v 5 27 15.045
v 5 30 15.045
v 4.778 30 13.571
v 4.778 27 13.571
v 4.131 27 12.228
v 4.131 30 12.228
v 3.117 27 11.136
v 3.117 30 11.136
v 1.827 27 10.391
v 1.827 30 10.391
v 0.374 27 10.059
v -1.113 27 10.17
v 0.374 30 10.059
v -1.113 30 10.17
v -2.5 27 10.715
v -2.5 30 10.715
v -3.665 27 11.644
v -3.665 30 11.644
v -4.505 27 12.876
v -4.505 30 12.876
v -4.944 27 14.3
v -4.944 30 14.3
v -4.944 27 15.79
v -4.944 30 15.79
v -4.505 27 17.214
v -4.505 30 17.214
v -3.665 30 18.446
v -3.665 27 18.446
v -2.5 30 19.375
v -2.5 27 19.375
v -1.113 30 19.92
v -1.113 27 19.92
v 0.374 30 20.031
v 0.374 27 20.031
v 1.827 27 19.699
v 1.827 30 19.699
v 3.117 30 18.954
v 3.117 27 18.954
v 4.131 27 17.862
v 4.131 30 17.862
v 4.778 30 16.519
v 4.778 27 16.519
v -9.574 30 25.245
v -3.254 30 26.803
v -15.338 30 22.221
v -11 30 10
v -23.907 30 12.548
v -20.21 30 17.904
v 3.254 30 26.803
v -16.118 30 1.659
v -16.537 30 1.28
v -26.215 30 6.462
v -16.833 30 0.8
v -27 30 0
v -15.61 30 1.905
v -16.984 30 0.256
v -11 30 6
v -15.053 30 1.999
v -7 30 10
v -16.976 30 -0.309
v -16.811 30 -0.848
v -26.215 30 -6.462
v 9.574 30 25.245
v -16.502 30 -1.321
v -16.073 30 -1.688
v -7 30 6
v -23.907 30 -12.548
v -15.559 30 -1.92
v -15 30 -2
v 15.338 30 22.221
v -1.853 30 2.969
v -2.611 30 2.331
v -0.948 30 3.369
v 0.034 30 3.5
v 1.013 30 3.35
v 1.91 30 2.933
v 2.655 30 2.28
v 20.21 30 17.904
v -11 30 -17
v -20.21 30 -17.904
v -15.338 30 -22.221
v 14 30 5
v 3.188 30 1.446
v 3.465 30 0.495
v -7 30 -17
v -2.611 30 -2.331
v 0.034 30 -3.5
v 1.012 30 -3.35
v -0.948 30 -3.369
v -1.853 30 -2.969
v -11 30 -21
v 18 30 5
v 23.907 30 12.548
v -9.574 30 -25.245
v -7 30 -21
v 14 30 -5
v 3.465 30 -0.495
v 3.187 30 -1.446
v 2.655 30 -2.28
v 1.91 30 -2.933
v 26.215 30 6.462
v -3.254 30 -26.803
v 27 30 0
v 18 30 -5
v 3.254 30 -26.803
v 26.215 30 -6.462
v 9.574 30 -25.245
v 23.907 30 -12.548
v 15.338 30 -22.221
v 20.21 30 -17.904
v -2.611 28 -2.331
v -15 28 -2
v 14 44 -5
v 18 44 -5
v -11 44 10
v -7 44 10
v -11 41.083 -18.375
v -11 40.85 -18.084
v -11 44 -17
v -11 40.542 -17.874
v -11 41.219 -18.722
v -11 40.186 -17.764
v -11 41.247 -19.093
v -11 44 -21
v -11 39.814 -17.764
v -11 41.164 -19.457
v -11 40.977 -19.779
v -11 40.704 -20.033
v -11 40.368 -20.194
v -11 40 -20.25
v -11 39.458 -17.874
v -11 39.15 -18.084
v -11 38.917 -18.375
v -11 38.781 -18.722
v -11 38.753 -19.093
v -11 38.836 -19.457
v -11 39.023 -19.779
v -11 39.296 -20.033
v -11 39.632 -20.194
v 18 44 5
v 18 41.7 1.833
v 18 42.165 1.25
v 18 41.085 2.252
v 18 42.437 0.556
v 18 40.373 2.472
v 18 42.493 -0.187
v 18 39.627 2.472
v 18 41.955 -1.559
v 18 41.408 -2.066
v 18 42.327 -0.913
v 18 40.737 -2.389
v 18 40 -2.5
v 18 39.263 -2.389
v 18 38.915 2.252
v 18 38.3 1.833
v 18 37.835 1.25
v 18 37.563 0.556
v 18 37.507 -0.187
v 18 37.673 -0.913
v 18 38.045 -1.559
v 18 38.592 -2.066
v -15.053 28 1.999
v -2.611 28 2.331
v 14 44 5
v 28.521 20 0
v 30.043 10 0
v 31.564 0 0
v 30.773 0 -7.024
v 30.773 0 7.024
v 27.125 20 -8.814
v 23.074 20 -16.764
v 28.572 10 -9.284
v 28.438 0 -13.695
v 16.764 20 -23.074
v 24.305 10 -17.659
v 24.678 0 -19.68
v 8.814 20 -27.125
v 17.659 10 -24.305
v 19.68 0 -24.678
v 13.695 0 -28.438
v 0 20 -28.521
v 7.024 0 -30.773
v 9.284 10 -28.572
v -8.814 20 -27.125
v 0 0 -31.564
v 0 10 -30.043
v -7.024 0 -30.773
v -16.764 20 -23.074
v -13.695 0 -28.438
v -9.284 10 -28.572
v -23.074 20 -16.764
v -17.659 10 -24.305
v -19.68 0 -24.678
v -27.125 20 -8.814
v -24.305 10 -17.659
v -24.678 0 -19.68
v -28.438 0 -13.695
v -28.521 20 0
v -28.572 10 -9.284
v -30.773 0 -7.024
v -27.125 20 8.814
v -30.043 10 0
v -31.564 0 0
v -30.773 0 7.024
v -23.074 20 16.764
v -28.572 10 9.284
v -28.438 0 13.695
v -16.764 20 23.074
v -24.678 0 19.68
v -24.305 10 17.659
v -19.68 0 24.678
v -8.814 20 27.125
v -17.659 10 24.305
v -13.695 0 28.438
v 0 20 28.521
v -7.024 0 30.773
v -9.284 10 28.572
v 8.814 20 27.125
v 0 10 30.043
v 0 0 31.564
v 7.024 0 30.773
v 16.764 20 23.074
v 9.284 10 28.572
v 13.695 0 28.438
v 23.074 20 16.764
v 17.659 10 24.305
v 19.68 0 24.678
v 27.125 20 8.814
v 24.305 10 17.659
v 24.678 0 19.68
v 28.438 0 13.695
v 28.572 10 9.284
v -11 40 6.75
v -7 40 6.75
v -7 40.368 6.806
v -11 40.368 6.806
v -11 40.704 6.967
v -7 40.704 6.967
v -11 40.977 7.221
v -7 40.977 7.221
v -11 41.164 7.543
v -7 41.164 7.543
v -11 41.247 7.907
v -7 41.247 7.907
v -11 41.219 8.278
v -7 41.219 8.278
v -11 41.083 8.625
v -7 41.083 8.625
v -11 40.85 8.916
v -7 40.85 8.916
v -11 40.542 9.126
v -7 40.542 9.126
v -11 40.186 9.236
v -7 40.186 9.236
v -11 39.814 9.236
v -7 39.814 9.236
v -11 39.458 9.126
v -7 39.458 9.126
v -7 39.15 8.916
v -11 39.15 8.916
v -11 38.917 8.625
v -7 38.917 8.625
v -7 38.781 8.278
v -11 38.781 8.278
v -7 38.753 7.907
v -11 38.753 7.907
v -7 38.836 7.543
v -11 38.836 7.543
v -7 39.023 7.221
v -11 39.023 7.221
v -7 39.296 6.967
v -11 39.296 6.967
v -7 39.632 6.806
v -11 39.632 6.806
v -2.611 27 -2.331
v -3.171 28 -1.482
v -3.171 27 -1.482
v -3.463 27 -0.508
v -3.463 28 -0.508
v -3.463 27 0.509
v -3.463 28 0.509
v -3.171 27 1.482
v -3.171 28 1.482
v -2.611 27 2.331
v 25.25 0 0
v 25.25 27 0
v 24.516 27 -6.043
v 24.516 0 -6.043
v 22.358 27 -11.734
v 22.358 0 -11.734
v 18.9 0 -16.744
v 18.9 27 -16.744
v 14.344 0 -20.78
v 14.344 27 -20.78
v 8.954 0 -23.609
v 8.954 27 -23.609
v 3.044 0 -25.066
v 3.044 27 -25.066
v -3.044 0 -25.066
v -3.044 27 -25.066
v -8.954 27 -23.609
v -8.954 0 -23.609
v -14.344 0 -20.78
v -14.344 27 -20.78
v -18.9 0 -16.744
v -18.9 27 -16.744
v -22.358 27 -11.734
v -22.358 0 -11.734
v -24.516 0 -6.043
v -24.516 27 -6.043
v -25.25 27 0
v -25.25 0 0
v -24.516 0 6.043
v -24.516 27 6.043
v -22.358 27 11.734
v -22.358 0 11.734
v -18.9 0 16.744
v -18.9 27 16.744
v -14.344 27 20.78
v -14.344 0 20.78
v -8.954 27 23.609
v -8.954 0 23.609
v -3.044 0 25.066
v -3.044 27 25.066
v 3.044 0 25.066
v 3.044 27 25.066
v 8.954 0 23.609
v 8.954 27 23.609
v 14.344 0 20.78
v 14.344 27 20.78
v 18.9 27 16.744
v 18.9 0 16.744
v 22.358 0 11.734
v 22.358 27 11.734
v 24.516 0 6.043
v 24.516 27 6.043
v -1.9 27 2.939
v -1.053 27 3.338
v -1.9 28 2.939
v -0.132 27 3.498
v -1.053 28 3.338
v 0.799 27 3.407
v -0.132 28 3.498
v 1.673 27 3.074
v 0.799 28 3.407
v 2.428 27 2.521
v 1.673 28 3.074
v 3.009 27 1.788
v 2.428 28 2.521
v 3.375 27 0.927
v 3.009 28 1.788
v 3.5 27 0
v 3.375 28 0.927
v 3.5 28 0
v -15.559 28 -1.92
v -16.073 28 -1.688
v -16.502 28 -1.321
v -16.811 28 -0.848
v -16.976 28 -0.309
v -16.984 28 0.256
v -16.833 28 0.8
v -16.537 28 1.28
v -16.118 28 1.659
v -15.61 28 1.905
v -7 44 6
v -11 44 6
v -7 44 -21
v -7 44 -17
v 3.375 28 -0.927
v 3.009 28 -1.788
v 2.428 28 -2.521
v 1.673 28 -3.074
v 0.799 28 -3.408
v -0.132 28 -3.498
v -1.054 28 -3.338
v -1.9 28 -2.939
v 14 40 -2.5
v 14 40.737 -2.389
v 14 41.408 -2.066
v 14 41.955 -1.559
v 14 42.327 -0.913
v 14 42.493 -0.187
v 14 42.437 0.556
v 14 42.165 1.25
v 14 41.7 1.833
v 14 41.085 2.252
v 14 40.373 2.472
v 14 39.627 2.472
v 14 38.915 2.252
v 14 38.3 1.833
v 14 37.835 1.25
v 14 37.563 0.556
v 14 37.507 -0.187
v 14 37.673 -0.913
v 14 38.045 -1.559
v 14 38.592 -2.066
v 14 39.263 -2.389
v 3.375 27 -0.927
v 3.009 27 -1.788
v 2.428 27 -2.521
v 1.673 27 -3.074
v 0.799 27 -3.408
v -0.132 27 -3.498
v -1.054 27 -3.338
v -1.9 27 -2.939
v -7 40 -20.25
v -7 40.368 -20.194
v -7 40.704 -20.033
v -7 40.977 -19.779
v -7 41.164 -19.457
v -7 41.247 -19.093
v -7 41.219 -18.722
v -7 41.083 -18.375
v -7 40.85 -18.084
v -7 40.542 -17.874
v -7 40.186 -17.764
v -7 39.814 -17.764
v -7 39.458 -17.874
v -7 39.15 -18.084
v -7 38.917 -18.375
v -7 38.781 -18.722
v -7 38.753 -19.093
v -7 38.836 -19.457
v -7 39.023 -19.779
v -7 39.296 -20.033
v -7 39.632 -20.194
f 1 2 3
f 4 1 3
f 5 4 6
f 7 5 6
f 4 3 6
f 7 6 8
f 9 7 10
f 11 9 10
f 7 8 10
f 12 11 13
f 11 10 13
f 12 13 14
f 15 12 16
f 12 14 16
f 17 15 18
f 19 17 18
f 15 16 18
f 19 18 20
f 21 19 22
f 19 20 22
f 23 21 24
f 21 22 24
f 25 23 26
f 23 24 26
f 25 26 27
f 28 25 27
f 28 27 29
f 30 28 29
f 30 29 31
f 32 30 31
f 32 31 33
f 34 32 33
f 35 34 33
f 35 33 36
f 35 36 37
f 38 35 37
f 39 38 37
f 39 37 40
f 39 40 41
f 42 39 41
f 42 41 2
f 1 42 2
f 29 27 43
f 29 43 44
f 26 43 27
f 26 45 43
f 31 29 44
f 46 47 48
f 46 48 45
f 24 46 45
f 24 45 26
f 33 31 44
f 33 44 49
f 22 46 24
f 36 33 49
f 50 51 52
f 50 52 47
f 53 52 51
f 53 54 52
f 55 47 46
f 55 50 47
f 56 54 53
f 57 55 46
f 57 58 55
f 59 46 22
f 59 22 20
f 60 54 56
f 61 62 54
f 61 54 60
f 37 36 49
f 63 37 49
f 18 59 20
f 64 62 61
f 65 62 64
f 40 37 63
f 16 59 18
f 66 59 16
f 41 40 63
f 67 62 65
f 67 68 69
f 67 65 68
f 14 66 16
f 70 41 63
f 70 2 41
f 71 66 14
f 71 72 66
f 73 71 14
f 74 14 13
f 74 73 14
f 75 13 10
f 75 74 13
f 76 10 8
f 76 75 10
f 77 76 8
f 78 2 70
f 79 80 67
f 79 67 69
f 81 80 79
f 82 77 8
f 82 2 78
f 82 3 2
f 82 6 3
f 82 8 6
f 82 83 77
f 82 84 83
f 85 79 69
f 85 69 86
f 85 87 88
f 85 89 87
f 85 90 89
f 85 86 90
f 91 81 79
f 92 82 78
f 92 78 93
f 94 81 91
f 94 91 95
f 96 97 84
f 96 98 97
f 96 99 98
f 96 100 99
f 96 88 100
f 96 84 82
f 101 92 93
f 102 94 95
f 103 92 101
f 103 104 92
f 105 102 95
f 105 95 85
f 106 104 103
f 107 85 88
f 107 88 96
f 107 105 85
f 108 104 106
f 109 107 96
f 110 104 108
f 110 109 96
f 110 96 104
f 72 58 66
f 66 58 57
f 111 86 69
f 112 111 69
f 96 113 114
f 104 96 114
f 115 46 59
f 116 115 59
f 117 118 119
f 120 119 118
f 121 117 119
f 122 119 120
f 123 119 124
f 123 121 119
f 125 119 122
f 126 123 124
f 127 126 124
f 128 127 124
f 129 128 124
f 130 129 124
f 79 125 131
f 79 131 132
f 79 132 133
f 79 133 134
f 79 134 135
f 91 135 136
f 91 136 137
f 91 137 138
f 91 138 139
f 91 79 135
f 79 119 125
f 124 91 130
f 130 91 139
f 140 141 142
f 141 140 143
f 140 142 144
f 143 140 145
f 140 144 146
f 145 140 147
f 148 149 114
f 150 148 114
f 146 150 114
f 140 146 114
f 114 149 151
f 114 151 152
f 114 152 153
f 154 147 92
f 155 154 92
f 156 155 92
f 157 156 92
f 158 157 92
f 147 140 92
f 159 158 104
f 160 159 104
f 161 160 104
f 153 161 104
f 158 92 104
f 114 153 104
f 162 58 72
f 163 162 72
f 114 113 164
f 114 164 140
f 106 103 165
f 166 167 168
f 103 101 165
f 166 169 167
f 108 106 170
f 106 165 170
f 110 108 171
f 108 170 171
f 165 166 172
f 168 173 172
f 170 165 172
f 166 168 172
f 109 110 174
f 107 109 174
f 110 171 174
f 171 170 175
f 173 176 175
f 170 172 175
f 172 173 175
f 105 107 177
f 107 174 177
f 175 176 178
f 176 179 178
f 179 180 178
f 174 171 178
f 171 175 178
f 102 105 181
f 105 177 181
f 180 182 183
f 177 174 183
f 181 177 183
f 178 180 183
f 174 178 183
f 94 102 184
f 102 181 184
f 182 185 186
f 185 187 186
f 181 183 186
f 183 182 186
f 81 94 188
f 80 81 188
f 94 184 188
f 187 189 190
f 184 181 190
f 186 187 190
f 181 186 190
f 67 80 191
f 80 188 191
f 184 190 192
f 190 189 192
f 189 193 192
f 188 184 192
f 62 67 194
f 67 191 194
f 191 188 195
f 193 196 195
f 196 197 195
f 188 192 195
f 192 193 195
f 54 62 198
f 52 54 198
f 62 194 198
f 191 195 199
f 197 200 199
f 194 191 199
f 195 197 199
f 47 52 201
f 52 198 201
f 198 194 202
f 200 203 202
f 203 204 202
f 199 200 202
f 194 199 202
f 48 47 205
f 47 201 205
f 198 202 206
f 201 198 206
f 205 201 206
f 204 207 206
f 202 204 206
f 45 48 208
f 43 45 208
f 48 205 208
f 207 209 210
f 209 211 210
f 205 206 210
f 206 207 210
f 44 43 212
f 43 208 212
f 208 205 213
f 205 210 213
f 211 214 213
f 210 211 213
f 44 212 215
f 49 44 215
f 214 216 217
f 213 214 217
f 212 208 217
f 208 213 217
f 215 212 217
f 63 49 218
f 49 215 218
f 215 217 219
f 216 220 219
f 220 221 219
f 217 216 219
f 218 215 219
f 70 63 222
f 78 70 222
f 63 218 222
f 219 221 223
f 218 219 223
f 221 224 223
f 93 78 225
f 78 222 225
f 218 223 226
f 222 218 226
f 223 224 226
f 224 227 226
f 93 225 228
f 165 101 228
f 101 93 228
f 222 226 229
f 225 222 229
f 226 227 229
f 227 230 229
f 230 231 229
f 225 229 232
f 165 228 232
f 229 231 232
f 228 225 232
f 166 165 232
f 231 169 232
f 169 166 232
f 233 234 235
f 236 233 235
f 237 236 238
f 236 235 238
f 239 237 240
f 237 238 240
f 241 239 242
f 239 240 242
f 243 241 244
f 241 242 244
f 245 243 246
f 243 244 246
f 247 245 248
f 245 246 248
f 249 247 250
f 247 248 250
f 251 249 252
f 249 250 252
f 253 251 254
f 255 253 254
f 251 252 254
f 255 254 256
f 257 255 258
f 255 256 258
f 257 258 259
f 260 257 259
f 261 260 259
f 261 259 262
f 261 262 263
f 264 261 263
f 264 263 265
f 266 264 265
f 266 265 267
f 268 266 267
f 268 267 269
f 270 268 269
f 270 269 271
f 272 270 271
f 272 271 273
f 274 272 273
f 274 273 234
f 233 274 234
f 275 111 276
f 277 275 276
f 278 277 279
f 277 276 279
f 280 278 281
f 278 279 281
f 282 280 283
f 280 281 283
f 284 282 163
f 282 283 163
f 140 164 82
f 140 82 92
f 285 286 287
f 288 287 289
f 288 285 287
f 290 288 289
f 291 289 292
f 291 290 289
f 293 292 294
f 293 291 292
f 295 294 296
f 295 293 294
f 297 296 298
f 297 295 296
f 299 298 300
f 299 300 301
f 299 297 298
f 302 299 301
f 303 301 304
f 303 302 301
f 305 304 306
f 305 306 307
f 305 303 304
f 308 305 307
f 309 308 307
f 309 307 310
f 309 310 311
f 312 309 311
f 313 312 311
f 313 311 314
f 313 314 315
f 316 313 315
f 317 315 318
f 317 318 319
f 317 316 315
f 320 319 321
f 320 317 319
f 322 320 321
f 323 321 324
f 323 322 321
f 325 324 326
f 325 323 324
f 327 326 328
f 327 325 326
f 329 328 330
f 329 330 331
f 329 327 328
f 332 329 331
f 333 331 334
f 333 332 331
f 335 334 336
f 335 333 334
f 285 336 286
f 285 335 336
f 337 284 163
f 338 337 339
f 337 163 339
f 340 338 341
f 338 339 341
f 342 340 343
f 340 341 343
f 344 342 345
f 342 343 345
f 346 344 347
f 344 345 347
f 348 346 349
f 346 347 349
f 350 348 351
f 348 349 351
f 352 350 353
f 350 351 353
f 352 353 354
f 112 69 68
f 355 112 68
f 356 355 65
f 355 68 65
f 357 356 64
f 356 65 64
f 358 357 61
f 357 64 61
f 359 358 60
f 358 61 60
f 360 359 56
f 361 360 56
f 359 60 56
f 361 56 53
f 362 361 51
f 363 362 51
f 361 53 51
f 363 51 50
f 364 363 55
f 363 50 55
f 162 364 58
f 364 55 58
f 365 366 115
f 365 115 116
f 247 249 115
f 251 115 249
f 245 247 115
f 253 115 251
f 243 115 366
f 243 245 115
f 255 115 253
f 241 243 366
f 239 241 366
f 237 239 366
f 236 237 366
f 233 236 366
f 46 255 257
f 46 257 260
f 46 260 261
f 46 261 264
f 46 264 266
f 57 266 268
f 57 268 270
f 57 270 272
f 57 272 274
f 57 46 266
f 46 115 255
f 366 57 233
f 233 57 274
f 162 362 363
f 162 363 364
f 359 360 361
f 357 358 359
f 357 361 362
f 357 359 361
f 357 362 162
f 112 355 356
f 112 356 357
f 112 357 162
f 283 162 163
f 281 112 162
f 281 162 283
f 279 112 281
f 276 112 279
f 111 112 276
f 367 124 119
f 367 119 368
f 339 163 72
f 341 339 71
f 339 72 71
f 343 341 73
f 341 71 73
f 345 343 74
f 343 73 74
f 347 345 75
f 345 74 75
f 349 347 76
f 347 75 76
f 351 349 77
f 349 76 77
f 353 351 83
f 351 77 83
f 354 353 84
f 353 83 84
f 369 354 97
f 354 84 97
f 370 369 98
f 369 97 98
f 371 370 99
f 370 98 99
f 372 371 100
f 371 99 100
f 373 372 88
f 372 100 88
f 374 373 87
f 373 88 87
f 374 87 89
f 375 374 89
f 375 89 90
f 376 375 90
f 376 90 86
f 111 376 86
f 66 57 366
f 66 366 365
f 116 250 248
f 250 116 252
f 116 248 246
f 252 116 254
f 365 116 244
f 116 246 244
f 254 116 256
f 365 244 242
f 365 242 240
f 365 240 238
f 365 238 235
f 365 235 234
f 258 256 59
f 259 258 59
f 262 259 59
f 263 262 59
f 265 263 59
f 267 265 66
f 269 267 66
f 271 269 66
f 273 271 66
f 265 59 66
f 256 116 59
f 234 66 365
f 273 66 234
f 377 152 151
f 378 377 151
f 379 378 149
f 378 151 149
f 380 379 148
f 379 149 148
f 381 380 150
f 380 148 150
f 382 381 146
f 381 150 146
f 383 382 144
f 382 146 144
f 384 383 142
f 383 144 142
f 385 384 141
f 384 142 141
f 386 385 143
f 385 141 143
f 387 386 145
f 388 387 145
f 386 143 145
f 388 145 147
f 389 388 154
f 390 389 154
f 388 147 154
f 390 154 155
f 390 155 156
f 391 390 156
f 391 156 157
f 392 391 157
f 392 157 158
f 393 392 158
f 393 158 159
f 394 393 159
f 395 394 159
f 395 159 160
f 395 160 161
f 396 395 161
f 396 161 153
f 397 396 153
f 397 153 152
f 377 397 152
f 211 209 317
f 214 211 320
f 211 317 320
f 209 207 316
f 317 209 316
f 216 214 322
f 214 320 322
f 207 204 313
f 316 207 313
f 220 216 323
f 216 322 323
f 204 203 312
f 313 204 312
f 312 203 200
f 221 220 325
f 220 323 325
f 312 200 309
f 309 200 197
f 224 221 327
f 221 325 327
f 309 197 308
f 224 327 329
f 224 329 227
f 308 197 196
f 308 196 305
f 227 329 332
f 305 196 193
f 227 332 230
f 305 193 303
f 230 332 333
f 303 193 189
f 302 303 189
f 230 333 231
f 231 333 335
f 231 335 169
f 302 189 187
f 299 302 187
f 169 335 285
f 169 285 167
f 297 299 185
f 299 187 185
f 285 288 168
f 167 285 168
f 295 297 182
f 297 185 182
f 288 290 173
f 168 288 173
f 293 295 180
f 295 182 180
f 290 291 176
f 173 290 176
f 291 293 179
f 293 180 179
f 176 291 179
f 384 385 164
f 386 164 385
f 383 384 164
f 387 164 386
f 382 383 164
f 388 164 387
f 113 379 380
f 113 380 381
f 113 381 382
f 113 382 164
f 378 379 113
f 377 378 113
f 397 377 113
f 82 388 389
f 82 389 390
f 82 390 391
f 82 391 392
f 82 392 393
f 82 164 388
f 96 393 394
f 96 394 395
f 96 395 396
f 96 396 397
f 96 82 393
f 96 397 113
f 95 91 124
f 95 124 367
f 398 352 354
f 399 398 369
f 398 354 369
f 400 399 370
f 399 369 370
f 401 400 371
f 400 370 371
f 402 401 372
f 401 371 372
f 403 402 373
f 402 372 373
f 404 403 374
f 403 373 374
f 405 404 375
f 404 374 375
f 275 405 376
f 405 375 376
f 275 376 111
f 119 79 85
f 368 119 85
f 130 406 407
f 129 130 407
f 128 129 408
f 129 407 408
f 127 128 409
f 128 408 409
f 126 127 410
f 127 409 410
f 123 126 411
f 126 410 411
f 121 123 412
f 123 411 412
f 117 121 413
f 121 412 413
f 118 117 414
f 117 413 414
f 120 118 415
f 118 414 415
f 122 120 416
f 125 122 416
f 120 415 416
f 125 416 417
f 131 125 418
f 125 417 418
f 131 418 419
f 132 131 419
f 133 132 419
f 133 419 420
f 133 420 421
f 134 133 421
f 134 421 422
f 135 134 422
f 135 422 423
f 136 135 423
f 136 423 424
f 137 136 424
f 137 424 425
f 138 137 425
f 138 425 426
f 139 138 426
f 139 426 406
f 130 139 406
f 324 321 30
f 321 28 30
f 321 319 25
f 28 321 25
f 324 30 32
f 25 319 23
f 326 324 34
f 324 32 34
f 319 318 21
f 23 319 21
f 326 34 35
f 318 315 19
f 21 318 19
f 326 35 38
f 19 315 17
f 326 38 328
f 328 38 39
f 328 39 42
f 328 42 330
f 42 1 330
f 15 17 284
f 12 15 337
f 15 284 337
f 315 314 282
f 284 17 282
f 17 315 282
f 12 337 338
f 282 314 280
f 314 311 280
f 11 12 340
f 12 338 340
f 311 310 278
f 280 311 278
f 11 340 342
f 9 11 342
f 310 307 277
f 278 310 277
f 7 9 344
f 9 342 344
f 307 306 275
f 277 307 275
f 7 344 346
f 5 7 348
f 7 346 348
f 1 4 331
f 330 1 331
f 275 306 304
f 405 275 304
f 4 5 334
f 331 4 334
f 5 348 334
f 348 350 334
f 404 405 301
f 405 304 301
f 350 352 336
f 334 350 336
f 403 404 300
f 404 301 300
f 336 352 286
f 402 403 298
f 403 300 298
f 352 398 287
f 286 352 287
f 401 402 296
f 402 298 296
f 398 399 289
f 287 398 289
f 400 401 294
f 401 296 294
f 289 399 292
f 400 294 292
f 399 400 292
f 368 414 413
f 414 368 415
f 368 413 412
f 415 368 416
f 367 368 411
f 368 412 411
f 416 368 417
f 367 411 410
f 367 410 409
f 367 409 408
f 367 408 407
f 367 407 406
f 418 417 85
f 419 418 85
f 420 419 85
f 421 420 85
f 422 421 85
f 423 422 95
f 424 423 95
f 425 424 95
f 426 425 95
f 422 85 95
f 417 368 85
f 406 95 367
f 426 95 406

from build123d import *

# Parameters (mm, degrees)
SKETCH_1_R          = 27
SKETCH_1_R_2        = 25.25
EXTRUDE_1_DEPTH     = 27
SKETCH_3_R          = 27
SKETCH_3_R_2        = 2.4
EXTRUDE_2_DEPTH     = 3
SKETCH_7_W          = 4
SKETCH_7_H          = 4
EXTRUDE_3_DEPTH     = 14
SKETCH_8_R          = 1.25
CUT_EXTRUDE_1_DEPTH = 14
SKETCH_10_W         = 4
SKETCH_10_H         = 10
EXTRUDE_4_DEPTH     = 14
SKETCH_11_R         = 2.5
CUT_EXTRUDE_3_DEPTH = 14
SKETCH_12_R         = 5
CUT_EXTRUDE_4_DEPTH = 14
SKETCH_13_R         = 2.4
CUT_EXTRUDE_5_DEPTH = 2
SKETCH_14_R         = 2.4
CUT_EXTRUDE_6_DEPTH = 91


with BuildPart() as part:
    # 草图1 → 凸台-拉伸1 (new body)
    with BuildSketch(Plane(origin=(0, 0, 0), x_dir=(1, 0, 0), z_dir=(0, 1, 0))):
        Circle(SKETCH_1_R)
        Circle(SKETCH_1_R_2, mode=Mode.SUBTRACT)
    extrude(amount=EXTRUDE_1_DEPTH)

    # 草图3 → 凸台-拉伸2 (add)
    with BuildSketch(Plane(origin=(0, 27, 0), x_dir=(1, 0, 0), z_dir=(0, 1, 0))):
        Circle(SKETCH_3_R)
        Circle(SKETCH_3_R_2, mode=Mode.SUBTRACT)
    extrude(amount=EXTRUDE_2_DEPTH)

    # 草图5 → 旋转2 (revolve)
    with BuildSketch(Plane.XY):
        Polygon((27, 30), (31.564027788, 0), (27, 0), align=None)
    revolve(axis=Axis((0, 0, 0), (0, 1, 0)))

    # 草图7 → 凸台-拉伸3 (add)
    with BuildSketch(Plane(origin=(0, 30, 0), x_dir=(1, 0, 0), z_dir=(0, 1, 0))):
        with Locations((-9, 19)):
            Rectangle(SKETCH_7_W, SKETCH_7_H)
        with Locations((-9, -8)):
            Rectangle(SKETCH_7_W, SKETCH_7_H)
    extrude(amount=EXTRUDE_3_DEPTH)

    # 草图8 → 切除-拉伸1 (cut)
    with BuildSketch(Plane(origin=(-7, 0, 0), x_dir=(0, 0, -1), z_dir=(1, 0, 0))):
        with Locations((-8, 40)):
            Circle(SKETCH_8_R)
        with Locations((19, 40)):
            Circle(SKETCH_8_R)
    extrude(amount=-CUT_EXTRUDE_1_DEPTH, mode=Mode.SUBTRACT)

    # 草图10 → 凸台-拉伸4 (add)
    with BuildSketch(Plane(origin=(0, 30, 0), x_dir=(1, 0, 0), z_dir=(0, 1, 0))):
        with Locations((16, 0)):
            Rectangle(SKETCH_10_W, SKETCH_10_H)
    extrude(amount=EXTRUDE_4_DEPTH)

    # 草图11 → 切除-拉伸3 (cut)
    with BuildSketch(Plane(origin=(18, 0, 0), x_dir=(0, 0, -1), z_dir=(1, 0, 0))):
        with Locations((0, 40)):
            Circle(SKETCH_11_R)
    extrude(amount=-CUT_EXTRUDE_3_DEPTH, mode=Mode.SUBTRACT)

    # 草图12 → 切除-拉伸4 (cut)
    with BuildSketch(Plane(origin=(0, 30, 0), x_dir=(1, 0, 0), z_dir=(0, 1, 0))):
        with Locations((0, -15.04505665)):
            Circle(SKETCH_12_R)
    extrude(amount=-CUT_EXTRUDE_4_DEPTH, mode=Mode.SUBTRACT)

    # 草图13 → 切除-拉伸5 (cut)
    with BuildSketch(Plane(origin=(0, 30, 0), x_dir=(1, 0, 0), z_dir=(0, 1, 0))):
        with BuildLine():
            Line((-2.610752853, 2.331087631), (-15, 2))
            ThreePointArc((-15, 2), (-16.999822183, 0.026669038), (-15.053333333, -1.999288762))
            Line((-15.053333333, -1.999288762), (-2.610641885, -2.331211906))
            ThreePointArc((-2.610641885, -2.331211906), (3.499999999, 8.3304e-05), (-2.610752853, 2.331087631))
        make_face()
        Circle(SKETCH_13_R, mode=Mode.SUBTRACT)
    extrude(amount=-CUT_EXTRUDE_5_DEPTH, mode=Mode.SUBTRACT)

    # 草图14 → 切除-拉伸6 (cut)
    with BuildSketch(Plane(origin=(0, 28, 0), x_dir=(1, 0, 0), z_dir=(0, 1, 0))):
        with BuildLine():
            ThreePointArc((-2.610752853, 2.331087631), (-3.499999999, -8.3304e-05), (-2.610641885, -2.331211906))
            ThreePointArc((-2.610641885, -2.331211906), (1.247548276, -3.270110594), (3.5, 0))
            ThreePointArc((3.5, 0), (1.247470444, 3.270140286), (-2.610752853, 2.331087631))
        make_face()
        Circle(SKETCH_14_R, mode=Mode.SUBTRACT)
    extrude(amount=-CUT_EXTRUDE_6_DEPTH, mode=Mode.SUBTRACT)


solid = part.part
